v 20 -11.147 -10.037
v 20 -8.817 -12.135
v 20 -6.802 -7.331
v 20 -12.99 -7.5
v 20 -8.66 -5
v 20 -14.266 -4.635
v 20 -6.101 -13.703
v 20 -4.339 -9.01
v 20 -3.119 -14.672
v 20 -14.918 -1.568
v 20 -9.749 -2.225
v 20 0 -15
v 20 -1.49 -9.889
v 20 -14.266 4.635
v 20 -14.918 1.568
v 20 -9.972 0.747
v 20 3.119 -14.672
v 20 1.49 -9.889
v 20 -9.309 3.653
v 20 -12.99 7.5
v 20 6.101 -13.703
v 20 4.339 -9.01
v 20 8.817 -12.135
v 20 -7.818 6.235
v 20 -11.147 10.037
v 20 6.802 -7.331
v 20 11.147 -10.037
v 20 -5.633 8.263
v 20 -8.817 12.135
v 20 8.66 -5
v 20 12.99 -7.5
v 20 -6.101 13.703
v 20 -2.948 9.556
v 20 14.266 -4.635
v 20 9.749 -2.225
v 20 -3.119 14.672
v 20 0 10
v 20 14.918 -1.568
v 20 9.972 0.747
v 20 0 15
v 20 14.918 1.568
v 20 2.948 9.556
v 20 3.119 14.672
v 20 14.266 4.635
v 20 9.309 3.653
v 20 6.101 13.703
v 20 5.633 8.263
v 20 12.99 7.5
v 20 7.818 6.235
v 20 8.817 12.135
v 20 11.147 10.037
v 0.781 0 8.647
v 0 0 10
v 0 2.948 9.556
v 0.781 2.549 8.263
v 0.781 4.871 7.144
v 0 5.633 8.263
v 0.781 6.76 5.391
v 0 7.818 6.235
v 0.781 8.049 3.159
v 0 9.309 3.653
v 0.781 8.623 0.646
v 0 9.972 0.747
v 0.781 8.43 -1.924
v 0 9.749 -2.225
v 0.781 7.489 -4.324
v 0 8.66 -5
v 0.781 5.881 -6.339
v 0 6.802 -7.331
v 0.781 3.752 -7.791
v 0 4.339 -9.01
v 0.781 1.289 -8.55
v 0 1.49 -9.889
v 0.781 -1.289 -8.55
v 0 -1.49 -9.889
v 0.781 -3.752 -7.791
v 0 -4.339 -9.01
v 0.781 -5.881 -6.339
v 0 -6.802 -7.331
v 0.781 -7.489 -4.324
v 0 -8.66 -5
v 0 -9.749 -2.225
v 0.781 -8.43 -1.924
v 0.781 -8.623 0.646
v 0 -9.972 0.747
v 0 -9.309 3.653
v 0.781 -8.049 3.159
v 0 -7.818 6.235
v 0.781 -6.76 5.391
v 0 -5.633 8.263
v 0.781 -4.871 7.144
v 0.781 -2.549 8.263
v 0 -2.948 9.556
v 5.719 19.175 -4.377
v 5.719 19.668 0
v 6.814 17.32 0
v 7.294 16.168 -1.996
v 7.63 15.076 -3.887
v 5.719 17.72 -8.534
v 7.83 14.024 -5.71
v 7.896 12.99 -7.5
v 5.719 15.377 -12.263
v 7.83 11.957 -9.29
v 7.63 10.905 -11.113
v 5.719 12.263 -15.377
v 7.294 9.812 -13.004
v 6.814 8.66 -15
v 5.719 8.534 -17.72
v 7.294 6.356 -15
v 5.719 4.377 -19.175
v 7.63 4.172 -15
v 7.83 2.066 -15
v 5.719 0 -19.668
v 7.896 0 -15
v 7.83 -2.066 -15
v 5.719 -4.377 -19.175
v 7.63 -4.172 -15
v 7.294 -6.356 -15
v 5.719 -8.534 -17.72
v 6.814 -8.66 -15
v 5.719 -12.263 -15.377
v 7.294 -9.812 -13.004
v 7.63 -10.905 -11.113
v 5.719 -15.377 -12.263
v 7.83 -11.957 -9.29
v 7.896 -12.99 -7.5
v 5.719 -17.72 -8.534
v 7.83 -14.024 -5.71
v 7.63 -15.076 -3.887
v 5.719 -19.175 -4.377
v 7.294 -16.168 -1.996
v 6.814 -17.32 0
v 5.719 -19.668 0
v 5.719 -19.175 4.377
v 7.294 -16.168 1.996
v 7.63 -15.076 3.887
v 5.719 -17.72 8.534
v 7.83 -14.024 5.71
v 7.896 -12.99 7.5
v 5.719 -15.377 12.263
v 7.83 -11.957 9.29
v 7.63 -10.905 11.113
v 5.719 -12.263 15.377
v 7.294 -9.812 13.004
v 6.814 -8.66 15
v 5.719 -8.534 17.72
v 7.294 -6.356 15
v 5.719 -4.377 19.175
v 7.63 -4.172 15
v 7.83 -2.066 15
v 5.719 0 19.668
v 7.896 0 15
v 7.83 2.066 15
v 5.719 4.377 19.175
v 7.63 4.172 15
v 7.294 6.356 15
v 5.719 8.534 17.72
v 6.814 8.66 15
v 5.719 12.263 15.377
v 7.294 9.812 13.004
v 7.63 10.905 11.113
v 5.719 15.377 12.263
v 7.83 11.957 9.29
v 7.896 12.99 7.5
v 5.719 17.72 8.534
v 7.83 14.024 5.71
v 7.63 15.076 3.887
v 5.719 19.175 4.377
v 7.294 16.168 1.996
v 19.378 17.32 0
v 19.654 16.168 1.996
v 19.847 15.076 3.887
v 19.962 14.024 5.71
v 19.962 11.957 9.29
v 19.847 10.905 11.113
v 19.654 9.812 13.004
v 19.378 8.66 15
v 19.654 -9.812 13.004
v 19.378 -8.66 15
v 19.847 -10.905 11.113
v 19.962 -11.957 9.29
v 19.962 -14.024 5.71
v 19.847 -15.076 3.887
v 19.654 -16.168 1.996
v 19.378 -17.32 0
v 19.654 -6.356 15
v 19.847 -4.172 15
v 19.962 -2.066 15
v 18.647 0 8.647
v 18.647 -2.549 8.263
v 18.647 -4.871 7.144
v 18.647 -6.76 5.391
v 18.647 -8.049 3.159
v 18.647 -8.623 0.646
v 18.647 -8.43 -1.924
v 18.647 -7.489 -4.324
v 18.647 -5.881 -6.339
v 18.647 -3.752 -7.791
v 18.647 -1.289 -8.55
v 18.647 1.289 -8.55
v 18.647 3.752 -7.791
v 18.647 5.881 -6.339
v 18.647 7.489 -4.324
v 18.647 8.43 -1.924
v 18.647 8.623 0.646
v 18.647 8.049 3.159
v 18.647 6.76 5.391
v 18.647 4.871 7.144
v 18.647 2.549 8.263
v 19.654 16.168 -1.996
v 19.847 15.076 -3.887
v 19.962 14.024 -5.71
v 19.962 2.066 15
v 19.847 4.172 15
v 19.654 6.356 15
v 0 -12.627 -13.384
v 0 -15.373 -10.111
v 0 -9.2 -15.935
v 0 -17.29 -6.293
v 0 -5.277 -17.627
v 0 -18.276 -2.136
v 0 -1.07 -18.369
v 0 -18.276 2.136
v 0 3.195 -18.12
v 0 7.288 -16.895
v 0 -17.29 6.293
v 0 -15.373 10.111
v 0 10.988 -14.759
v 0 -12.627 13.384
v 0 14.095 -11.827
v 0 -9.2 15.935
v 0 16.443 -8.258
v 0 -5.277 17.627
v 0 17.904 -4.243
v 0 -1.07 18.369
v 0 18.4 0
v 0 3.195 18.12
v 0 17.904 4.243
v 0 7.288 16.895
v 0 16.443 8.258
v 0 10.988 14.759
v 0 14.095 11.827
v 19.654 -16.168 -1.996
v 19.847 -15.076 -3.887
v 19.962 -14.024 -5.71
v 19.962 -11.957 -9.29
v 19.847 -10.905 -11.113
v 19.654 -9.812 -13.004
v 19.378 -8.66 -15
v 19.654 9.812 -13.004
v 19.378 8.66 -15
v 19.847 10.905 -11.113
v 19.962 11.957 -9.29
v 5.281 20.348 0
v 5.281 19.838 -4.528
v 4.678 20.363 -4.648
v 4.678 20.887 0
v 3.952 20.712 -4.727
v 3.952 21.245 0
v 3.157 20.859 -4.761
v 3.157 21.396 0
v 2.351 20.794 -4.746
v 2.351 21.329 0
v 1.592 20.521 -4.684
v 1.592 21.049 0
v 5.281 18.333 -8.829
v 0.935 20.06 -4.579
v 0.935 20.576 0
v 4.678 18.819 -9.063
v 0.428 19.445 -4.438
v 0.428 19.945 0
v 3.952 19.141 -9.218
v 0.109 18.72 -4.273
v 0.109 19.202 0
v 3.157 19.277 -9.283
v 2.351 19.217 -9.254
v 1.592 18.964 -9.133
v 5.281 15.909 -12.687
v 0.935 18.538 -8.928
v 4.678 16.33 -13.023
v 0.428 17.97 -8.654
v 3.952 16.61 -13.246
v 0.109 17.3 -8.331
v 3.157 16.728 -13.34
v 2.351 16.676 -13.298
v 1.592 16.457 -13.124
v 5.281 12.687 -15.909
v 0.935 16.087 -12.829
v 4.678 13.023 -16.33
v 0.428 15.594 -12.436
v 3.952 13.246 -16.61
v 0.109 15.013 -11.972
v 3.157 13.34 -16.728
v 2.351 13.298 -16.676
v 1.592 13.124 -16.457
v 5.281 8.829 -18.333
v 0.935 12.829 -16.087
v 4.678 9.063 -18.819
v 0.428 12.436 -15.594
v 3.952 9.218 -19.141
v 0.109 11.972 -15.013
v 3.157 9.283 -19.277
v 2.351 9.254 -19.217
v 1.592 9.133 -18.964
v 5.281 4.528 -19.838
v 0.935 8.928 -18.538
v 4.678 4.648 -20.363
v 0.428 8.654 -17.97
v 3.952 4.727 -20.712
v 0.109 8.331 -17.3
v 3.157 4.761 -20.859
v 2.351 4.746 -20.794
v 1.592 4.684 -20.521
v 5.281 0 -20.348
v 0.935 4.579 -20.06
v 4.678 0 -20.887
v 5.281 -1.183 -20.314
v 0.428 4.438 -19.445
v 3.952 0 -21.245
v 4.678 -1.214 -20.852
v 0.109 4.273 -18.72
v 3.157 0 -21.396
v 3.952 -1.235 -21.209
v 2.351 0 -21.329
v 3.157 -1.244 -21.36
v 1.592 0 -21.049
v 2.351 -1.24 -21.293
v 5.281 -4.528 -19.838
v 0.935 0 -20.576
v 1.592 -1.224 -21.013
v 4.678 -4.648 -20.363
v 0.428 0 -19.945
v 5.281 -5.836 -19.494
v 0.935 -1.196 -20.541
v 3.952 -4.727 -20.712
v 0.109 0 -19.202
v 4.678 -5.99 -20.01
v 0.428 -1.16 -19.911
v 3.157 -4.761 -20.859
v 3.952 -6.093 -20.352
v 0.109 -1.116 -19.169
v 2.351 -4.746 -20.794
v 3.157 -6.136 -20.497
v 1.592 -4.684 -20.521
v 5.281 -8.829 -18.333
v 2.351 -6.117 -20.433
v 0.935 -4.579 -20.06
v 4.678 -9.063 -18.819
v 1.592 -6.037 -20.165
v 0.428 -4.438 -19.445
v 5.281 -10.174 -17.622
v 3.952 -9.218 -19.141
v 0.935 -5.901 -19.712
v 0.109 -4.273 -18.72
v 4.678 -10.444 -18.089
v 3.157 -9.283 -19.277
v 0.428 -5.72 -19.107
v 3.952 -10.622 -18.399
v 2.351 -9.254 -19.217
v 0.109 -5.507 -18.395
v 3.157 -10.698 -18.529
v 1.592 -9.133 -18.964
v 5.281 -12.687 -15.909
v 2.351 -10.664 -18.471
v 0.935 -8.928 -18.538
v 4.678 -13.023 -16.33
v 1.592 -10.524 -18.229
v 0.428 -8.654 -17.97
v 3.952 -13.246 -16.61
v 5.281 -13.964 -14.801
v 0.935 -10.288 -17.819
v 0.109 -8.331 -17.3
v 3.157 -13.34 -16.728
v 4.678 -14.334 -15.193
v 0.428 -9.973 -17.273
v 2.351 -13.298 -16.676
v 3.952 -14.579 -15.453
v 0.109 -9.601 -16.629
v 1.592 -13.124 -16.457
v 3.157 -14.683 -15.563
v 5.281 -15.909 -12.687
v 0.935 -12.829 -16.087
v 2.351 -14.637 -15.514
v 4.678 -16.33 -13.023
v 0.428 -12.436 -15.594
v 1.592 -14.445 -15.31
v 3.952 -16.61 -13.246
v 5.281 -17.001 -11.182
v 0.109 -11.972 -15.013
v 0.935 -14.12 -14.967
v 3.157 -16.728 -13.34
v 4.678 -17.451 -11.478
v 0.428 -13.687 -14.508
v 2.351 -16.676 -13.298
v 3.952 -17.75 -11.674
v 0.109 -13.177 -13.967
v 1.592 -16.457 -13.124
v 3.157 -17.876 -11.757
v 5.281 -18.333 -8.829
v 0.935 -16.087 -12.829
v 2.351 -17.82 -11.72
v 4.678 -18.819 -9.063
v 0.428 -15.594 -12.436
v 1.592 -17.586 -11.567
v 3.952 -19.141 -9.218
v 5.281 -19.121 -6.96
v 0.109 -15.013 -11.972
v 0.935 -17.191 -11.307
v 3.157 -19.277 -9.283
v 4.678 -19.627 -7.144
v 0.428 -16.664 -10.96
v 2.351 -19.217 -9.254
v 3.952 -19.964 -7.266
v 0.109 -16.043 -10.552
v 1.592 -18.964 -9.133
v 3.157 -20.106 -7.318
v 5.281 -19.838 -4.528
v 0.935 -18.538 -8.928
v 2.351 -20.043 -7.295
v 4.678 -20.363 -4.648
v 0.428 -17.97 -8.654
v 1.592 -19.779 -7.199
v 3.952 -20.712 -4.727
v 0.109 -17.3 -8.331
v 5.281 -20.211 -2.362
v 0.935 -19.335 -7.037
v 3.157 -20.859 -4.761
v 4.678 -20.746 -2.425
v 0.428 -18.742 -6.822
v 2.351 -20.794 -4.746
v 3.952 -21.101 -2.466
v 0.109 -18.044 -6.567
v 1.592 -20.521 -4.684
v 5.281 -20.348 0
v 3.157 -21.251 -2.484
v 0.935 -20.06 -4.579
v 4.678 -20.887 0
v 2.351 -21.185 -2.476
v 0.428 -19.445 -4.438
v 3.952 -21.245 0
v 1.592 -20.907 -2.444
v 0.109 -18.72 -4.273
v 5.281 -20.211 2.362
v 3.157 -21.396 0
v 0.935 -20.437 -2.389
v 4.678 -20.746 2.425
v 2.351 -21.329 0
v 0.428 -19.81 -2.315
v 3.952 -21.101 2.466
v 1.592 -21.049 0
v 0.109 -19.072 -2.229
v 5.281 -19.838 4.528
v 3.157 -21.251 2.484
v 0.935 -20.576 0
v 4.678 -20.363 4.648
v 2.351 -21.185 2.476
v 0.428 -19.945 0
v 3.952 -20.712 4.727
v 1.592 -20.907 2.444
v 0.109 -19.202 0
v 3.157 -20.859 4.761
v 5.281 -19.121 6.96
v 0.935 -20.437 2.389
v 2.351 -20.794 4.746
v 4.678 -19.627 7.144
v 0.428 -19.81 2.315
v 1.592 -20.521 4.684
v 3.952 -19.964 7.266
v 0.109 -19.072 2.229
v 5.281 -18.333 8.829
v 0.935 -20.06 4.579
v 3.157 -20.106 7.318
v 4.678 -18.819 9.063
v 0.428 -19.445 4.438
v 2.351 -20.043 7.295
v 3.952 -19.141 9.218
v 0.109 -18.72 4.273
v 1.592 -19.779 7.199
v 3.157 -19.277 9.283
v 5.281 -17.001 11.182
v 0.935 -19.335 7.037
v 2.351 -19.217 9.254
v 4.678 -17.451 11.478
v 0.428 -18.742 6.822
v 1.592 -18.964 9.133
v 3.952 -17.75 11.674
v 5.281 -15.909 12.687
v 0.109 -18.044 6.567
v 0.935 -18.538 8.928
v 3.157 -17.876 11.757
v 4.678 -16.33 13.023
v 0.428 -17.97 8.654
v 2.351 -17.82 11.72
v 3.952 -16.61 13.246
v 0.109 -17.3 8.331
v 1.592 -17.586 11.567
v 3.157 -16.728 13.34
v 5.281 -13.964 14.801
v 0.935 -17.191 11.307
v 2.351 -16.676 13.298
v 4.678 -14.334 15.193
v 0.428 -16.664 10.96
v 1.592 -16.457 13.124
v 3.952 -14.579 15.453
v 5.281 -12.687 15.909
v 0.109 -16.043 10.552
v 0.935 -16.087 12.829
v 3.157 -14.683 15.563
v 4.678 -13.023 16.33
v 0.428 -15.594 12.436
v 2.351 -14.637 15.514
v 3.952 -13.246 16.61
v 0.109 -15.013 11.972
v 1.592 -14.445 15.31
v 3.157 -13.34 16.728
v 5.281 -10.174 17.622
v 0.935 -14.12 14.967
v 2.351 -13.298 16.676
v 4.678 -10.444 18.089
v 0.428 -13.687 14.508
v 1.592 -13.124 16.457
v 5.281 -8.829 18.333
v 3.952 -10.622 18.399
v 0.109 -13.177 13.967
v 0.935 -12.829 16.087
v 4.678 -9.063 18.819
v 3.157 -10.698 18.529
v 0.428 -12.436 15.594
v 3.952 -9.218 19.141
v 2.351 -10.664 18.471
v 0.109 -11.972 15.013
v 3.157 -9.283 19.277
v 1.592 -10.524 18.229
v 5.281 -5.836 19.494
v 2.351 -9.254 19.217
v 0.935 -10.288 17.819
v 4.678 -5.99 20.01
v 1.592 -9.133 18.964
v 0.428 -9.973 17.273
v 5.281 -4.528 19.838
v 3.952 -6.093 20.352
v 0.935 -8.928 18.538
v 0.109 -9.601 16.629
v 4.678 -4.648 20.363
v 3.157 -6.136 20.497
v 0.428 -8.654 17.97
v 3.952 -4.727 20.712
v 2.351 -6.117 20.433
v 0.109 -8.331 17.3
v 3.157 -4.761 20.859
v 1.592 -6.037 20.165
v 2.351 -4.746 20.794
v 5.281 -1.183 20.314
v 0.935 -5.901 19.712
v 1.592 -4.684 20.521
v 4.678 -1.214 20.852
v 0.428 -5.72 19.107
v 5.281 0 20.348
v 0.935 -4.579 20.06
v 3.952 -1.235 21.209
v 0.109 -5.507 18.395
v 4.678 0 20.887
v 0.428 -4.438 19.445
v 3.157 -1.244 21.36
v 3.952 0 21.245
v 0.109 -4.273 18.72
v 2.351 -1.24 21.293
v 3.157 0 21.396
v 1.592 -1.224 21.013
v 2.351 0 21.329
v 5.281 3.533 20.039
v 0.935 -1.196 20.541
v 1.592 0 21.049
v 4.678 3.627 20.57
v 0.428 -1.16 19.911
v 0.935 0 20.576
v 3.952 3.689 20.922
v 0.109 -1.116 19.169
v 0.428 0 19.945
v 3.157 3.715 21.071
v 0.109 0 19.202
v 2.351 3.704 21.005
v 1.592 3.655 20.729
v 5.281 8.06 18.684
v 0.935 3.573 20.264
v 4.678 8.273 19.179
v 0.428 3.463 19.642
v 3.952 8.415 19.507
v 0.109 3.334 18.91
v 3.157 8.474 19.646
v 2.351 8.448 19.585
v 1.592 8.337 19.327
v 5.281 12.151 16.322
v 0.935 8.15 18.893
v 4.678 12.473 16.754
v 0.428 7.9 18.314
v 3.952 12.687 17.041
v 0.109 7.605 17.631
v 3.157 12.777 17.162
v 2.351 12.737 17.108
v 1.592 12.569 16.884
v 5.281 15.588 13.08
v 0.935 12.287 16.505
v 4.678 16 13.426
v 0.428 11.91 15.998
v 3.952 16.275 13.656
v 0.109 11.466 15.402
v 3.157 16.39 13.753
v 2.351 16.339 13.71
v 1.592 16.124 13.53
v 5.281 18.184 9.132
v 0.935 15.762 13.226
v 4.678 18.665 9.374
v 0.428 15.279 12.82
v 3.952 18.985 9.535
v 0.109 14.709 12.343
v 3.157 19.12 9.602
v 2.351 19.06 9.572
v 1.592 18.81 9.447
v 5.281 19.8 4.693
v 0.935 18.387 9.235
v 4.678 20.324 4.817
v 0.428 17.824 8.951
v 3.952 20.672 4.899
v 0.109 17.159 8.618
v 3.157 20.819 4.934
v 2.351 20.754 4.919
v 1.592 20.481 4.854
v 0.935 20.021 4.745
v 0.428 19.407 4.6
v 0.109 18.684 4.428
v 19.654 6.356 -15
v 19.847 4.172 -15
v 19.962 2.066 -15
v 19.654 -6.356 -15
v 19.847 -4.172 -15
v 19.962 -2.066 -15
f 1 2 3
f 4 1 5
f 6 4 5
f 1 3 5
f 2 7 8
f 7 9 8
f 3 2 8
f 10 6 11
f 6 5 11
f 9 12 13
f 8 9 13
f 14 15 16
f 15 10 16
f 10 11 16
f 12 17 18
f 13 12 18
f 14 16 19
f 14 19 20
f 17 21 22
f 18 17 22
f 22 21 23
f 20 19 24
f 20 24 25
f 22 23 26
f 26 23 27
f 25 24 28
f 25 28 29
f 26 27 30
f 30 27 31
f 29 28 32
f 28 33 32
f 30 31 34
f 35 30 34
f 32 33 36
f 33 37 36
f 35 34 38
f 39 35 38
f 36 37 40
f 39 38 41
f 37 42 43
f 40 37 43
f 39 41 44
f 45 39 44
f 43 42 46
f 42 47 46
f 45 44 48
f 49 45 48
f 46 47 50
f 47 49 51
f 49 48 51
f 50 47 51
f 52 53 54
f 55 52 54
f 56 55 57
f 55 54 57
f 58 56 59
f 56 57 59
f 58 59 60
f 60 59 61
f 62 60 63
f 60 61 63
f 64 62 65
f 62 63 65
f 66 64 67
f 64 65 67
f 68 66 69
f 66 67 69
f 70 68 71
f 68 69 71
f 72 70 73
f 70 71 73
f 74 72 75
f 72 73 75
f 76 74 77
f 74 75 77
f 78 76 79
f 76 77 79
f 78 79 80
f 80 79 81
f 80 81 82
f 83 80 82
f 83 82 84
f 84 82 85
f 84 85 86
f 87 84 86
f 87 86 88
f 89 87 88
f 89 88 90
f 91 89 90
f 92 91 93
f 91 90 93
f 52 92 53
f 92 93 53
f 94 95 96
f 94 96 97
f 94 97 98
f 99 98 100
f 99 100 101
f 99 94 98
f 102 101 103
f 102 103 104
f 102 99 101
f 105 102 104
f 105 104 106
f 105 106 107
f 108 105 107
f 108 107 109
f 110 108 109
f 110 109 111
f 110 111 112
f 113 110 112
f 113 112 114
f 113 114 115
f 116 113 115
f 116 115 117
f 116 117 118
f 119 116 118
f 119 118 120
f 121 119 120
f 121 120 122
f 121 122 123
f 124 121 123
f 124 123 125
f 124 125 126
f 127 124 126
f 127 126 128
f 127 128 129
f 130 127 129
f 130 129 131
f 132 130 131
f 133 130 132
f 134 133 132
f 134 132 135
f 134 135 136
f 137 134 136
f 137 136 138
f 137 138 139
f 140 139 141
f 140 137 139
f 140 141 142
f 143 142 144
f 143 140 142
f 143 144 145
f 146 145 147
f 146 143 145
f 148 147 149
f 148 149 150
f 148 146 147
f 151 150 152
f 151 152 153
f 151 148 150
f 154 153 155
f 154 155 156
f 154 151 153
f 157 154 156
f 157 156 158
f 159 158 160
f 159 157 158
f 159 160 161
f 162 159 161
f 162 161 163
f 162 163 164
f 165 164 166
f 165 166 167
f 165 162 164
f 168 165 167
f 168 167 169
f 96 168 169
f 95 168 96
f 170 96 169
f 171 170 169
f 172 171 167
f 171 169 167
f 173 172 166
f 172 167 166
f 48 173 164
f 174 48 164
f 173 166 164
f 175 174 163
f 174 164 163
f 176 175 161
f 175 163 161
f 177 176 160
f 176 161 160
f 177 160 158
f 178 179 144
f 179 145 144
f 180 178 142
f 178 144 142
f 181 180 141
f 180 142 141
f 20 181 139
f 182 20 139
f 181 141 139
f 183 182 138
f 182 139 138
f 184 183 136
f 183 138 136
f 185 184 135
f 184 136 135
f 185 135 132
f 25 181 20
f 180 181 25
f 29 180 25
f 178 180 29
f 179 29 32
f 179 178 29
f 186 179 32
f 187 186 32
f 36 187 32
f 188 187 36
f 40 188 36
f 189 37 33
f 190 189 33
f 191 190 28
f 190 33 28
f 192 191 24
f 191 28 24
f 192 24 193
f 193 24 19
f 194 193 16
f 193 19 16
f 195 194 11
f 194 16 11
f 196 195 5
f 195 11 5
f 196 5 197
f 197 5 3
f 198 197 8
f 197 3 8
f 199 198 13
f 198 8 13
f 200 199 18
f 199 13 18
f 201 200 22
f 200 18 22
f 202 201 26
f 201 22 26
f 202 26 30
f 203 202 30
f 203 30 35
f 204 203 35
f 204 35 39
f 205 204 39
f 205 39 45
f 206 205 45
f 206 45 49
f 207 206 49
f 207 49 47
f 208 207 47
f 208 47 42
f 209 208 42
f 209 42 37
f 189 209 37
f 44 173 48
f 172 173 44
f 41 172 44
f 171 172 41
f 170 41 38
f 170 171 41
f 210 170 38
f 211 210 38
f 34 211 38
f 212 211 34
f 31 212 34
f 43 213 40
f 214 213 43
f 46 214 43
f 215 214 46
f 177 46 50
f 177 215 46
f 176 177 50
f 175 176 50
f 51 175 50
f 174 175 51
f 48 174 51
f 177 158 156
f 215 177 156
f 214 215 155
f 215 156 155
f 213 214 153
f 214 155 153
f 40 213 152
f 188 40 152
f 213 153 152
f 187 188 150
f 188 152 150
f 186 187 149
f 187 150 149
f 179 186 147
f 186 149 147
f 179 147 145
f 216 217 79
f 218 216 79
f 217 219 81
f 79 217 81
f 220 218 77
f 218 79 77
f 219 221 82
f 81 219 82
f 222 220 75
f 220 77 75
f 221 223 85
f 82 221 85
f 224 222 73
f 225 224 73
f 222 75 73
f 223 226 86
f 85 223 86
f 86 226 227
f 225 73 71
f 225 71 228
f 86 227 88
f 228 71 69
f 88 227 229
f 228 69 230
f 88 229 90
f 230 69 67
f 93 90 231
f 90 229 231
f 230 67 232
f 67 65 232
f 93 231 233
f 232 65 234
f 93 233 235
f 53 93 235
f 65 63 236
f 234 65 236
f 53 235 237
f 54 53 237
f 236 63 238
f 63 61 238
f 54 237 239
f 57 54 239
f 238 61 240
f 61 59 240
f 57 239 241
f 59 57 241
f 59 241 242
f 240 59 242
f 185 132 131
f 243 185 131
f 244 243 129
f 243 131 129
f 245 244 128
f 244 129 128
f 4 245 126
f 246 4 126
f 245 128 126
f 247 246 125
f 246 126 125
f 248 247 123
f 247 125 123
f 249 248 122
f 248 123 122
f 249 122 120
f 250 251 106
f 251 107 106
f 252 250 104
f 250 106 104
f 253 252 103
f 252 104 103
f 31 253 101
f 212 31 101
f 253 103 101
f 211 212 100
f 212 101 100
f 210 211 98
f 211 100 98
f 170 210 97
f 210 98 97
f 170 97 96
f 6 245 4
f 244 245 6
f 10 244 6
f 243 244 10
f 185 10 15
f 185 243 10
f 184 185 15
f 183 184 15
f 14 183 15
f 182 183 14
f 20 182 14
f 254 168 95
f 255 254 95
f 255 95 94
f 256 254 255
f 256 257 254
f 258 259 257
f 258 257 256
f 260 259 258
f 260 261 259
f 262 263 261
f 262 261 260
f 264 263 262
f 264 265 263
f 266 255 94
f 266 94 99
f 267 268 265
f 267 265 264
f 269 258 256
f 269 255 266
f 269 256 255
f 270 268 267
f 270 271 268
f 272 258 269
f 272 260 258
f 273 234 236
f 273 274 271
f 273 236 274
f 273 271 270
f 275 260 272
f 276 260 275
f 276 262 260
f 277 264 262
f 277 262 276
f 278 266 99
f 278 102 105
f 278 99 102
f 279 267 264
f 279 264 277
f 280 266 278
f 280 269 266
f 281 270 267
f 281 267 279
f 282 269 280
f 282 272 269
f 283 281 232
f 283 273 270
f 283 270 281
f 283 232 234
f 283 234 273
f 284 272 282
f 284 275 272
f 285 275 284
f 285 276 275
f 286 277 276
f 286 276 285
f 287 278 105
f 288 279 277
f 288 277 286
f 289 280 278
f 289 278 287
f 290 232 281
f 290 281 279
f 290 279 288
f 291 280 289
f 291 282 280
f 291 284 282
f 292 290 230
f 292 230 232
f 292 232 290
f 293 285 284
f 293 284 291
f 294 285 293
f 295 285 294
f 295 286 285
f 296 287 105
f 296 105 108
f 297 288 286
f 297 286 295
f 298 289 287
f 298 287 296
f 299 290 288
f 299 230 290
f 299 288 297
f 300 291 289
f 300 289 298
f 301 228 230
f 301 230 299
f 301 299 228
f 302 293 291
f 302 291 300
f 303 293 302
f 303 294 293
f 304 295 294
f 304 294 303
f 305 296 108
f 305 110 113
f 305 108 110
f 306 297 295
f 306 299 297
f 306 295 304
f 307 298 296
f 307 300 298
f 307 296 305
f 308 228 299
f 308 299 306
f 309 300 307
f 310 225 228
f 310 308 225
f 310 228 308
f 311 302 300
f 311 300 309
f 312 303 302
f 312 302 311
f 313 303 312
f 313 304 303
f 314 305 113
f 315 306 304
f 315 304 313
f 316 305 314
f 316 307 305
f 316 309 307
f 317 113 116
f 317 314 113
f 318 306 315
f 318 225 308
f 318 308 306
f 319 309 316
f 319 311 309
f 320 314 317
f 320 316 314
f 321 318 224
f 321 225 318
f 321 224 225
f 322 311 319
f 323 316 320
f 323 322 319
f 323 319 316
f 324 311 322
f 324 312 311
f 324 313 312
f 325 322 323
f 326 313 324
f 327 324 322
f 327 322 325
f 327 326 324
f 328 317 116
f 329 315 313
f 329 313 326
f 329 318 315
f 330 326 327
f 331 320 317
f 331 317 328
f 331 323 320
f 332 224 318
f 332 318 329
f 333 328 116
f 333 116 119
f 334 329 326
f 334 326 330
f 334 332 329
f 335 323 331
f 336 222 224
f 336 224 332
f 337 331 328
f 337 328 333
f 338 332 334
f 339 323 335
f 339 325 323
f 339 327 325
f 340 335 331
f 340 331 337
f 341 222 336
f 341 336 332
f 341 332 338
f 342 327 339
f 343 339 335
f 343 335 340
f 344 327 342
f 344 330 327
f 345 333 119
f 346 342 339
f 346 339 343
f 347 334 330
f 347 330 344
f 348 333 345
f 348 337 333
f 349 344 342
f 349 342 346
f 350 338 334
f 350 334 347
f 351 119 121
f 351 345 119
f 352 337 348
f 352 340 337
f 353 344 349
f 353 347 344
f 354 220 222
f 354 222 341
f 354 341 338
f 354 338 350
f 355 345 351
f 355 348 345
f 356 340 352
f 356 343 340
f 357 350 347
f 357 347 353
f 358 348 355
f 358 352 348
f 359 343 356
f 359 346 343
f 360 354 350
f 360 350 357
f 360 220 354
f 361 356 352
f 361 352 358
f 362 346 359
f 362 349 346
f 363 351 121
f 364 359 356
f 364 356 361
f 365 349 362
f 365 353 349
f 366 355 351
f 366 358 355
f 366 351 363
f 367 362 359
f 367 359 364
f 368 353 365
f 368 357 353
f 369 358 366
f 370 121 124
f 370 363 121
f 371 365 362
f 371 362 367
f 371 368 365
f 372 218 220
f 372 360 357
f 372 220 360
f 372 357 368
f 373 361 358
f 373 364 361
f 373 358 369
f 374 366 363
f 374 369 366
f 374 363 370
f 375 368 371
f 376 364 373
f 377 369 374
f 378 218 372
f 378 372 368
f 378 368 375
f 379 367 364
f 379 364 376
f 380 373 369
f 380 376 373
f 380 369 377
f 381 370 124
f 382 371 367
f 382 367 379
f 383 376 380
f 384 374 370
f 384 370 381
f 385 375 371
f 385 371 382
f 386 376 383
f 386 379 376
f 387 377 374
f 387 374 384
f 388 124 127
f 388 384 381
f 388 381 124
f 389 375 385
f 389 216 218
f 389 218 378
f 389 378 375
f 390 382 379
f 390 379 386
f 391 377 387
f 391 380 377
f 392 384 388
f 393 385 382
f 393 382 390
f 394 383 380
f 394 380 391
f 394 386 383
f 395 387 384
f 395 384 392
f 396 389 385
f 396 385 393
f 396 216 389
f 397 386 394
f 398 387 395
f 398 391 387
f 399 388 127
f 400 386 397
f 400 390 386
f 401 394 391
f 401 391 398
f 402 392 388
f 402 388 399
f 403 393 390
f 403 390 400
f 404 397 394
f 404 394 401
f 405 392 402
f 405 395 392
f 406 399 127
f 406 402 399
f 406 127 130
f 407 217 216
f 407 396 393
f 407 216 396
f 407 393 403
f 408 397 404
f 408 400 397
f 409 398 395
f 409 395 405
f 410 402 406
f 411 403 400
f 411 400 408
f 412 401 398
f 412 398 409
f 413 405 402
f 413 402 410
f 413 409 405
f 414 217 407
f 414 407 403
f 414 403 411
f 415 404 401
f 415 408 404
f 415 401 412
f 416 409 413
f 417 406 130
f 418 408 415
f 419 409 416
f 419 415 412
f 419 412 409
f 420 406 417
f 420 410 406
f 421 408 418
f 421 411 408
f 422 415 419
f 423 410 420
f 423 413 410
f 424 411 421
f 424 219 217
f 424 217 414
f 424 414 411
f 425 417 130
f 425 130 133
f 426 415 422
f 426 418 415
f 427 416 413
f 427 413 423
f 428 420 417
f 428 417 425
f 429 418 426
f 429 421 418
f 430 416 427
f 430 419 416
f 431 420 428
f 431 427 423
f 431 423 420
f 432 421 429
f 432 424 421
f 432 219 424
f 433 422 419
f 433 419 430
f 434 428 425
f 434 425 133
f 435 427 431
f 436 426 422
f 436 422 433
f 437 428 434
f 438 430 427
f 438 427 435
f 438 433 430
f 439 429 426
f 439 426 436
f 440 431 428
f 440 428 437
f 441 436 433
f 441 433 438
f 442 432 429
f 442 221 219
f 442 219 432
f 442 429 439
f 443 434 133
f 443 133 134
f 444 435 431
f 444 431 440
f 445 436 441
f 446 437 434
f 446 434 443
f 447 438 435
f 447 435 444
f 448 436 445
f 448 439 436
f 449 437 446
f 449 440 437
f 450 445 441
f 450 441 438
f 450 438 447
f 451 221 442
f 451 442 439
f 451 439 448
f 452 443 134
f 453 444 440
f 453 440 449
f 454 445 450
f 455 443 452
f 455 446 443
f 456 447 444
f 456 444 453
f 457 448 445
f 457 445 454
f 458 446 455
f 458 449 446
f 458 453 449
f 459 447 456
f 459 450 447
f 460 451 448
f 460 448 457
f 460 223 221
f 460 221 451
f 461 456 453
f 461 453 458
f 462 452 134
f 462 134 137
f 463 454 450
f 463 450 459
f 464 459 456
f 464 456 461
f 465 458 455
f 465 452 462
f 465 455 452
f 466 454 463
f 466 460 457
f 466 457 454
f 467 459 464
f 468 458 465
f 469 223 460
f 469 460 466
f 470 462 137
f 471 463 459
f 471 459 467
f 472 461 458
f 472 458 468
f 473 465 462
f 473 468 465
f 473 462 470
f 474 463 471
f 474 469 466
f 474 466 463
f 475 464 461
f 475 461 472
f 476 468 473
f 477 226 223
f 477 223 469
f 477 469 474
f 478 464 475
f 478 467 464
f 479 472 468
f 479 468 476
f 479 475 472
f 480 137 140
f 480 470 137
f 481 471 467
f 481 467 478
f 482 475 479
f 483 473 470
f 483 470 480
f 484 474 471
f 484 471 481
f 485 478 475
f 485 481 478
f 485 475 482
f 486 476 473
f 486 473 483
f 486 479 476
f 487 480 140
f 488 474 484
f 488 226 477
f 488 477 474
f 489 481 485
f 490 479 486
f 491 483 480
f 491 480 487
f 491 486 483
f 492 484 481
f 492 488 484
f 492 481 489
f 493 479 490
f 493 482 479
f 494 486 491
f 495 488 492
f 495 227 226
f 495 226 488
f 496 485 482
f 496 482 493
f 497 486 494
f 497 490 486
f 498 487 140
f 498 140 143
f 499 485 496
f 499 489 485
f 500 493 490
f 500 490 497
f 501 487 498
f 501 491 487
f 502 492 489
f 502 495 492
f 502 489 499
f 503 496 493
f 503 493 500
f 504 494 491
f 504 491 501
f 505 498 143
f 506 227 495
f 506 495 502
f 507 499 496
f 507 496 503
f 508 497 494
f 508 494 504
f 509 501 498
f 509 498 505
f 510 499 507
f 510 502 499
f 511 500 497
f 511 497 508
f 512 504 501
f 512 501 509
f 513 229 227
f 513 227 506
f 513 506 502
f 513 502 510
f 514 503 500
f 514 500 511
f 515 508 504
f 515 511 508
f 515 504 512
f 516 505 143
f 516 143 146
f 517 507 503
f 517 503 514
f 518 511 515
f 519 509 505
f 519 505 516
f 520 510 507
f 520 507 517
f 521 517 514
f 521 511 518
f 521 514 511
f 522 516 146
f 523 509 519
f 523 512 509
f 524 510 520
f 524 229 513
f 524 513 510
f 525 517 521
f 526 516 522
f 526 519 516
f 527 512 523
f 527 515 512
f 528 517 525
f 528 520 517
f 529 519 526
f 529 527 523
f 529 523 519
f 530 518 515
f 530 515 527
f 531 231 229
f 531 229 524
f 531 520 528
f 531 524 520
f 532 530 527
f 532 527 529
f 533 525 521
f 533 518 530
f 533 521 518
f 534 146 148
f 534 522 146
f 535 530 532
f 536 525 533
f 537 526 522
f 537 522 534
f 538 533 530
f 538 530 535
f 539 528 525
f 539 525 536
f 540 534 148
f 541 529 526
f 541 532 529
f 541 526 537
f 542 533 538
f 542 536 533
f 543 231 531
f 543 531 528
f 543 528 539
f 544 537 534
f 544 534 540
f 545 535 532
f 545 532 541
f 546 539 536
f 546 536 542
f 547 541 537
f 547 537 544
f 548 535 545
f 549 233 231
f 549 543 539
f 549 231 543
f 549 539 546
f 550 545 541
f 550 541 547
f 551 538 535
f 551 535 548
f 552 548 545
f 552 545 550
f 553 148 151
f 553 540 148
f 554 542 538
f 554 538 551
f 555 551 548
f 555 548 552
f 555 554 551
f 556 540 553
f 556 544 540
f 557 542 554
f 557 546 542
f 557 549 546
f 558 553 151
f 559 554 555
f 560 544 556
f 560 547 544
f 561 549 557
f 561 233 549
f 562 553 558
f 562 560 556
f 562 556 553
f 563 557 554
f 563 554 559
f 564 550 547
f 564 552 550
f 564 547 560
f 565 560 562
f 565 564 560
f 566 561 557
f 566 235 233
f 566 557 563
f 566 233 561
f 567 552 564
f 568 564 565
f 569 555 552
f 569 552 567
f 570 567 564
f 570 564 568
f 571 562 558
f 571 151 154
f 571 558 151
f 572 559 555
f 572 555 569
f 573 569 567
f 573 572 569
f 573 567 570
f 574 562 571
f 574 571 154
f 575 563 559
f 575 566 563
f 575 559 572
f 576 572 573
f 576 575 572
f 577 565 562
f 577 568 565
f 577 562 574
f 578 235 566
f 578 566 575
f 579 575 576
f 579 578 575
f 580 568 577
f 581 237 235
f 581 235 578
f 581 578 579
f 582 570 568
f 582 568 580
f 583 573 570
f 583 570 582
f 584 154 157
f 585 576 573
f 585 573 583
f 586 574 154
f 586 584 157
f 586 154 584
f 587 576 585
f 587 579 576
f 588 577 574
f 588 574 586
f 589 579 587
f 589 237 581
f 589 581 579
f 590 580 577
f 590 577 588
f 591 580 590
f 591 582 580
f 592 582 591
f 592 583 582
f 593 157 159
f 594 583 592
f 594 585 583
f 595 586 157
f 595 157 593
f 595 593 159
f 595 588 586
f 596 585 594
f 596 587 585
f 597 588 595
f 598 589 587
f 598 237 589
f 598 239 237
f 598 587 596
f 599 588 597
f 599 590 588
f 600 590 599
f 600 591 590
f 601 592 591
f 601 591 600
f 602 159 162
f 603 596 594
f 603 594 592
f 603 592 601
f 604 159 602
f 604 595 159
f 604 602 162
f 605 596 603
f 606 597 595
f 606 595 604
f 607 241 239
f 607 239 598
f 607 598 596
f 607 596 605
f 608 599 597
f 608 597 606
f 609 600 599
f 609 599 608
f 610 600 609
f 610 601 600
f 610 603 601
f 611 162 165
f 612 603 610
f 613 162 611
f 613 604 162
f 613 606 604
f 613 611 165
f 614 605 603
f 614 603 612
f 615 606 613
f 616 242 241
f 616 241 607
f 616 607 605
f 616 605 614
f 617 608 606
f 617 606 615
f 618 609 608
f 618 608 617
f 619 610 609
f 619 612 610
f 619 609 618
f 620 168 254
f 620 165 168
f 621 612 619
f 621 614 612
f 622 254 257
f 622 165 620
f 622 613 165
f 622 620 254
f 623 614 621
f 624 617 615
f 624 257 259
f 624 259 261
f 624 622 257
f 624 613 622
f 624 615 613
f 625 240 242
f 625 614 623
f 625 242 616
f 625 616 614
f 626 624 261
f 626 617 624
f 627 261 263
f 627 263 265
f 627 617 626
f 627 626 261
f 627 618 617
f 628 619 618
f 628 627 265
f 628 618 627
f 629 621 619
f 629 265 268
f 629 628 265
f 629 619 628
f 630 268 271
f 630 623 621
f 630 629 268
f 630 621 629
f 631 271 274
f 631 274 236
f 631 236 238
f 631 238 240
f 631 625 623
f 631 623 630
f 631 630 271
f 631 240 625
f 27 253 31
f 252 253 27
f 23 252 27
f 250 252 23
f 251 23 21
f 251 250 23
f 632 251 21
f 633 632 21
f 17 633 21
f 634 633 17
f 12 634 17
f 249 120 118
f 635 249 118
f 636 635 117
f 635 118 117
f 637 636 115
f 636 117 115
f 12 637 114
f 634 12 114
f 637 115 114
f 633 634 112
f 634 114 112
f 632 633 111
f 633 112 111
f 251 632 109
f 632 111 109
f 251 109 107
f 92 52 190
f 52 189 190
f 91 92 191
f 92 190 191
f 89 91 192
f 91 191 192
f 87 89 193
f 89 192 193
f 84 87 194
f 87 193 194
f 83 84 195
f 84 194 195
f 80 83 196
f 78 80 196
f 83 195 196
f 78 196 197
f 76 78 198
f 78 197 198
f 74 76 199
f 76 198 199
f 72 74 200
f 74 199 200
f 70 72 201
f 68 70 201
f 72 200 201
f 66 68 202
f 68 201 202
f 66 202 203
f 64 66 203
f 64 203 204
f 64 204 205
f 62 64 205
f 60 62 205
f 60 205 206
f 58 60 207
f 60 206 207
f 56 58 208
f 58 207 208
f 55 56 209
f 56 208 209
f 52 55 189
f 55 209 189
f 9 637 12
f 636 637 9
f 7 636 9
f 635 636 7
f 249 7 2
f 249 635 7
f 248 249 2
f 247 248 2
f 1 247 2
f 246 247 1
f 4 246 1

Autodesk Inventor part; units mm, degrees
ref_plane "YZ Plane" through (0, 0, 0) normal (1, 0, 0) x (0, 1, 0)
ref_plane "XZ Plane" through (0, 0, 0) normal (0, 1, 0) x (-1, 0, 0)
sketch "Эскиз1" plane through (0, 0, 0) normal (0, 0, 1) x (1, 0, 0)
  line L0 (-4.6105, 0) -> (24.1018, 0) projected
  line L1 (7.8956, 15) -> (5.7189, 19.6679)
  line L2 (7.8956, 15) -> (20, 15) construction
  line L3 (20, 15) -> (20, 0) construction
  arc A0 (5.7189, 19.6679) -> (0, 18.4) centre (3, 18.4) ccw
  line L4 (7.8956, 15) -> (7.8956, 0)
  line L5 (0, -4.3926) -> (0, 26.3554) projected
  point P0 (0, 0)
  dimension "d2" = 30
  dimension "d4" = 42.8
  dimension "d5" = 3
  dimension "d15" = 20
  dimension "d16" = 25
revolve "Кольцо" add sketch "Эскиз1" angle 360 about axis through (-10, 0, 0) along (1, 0, 0)
sketch "Эскиз2" plane through (0, 0, 0) normal (-1, 0, 0) x (0, 0, 1)
  circle A0 centre (0, 0) radius 4.9
  line L0 (-15, -8.6603) -> (-15, 8.6603)
  line L1 (-15, 8.6603) -> (0, 17.3205)
  line L2 (0, 17.3205) -> (15, 8.6603)
  line L3 (15, 8.6603) -> (15, -8.6603)
  line L4 (15, -8.6603) -> (0, -17.3205)
  line L5 (0, -17.3205) -> (-15, -8.6603)
  circle A1 centre (0, 0) radius 18.4 projected
  dimension "d6" = 34.641
extrude "Базовый элемент" add sketch "Эскиз2" against normal blind 20 contours A0 | L0 L1 L2 L3 L4 L5
sketch "Эскиз3" plane through (0, 0, 0) normal (0, 0, 1) x (1, 0, 0)
  line L0 (6.8135, 17.3205) -> (20, 17.3205) projected
  line L1 (20, 8.6603) -> (20, 17.3205) projected
  line L2 (0, -18.4) -> (0, 18.4) projected
  line L3 (-4, 0) -> (24, 0) projected
  line L4 (19.3782, 17.3205) -> (20, 15)
  dimension "d10" = 15
  dimension "d11" = 30
revolve "Фаска1" cut sketch "Эскиз3" angle 360 about axis through (-10, 0, 0) along (1, 0, 0)
sketch "Эскиз4" plane through (0, 0, 0) normal (-1, 0, 0) x (0, 0, 1)
  circle A0 centre (0, 0) radius 18.4 projected
hole "Резьба" at (0, 0, 0) direction (1, 0, 0) diameter 17.294 end through all thread size "M20x2.5" class "6H" standard "ISO Metric profile"
chamfer "Фаска2" distance 1.3532 angle 30 1 edges at (0, 0, -8.647) measured on face at (0, 14.9498, -1.8152)
ref_plane "Work Plane1" through (63.747, 0, 0) normal (0, 0, -1) x (-1, 0, 0)
chamfer "Фаска3" distance 1.3532 angle 45 1 edges at (20, 0, -8.647)
equation "\"d6\" = 1.1547 * SW"
equation "\"d7\" = KOH"
equation "\"d12\" = -0.5 * GD1 + 0.5 * NND"
equation "\"d46\" = -0.5 * GD1 + 0.5 * NND"
equation "\"d51\" = -0.5 * GD1 + 0.5 * NND"
equation "\"d2\" = SW"
equation "\"d4\" = LADI"
equation "\"d5\" = PHH"
equation "\"d15\" = KOH"
equation "\"d16\" = KEWI"
equation "\"d10\" = ANG1"
equation "\"d11\" = SW0"
equation "\"ANG1\" = 15deg"
equation "\"KEWI\" = 25deg"
equation "\"LADI\" = 42.8"
equation "\"SW\" = 30"
equation "\"PHH\" = RR"
equation "\"KOH\" = NND"
equation "\"SW0\" = SW"
equation "\"d1\" = LADI"
equation "\"d3\" = PHH"
equation "\"GUL\" = 0.541266 * PTC"
equation "\"RR\" = 3"
equation "\"TOA\" = 30deg"
equation "\"PTC\" = 2.5"
equation "\"GAL\" = 0.541266 * PTC"
equation "\"E0\" = 1.155 * SW"
equation "\"GD1\" = 17.293671"
equation "\"NND\" = 20"
properties part number "DIN 6923 - M20" material "Сталь, мягкая"
